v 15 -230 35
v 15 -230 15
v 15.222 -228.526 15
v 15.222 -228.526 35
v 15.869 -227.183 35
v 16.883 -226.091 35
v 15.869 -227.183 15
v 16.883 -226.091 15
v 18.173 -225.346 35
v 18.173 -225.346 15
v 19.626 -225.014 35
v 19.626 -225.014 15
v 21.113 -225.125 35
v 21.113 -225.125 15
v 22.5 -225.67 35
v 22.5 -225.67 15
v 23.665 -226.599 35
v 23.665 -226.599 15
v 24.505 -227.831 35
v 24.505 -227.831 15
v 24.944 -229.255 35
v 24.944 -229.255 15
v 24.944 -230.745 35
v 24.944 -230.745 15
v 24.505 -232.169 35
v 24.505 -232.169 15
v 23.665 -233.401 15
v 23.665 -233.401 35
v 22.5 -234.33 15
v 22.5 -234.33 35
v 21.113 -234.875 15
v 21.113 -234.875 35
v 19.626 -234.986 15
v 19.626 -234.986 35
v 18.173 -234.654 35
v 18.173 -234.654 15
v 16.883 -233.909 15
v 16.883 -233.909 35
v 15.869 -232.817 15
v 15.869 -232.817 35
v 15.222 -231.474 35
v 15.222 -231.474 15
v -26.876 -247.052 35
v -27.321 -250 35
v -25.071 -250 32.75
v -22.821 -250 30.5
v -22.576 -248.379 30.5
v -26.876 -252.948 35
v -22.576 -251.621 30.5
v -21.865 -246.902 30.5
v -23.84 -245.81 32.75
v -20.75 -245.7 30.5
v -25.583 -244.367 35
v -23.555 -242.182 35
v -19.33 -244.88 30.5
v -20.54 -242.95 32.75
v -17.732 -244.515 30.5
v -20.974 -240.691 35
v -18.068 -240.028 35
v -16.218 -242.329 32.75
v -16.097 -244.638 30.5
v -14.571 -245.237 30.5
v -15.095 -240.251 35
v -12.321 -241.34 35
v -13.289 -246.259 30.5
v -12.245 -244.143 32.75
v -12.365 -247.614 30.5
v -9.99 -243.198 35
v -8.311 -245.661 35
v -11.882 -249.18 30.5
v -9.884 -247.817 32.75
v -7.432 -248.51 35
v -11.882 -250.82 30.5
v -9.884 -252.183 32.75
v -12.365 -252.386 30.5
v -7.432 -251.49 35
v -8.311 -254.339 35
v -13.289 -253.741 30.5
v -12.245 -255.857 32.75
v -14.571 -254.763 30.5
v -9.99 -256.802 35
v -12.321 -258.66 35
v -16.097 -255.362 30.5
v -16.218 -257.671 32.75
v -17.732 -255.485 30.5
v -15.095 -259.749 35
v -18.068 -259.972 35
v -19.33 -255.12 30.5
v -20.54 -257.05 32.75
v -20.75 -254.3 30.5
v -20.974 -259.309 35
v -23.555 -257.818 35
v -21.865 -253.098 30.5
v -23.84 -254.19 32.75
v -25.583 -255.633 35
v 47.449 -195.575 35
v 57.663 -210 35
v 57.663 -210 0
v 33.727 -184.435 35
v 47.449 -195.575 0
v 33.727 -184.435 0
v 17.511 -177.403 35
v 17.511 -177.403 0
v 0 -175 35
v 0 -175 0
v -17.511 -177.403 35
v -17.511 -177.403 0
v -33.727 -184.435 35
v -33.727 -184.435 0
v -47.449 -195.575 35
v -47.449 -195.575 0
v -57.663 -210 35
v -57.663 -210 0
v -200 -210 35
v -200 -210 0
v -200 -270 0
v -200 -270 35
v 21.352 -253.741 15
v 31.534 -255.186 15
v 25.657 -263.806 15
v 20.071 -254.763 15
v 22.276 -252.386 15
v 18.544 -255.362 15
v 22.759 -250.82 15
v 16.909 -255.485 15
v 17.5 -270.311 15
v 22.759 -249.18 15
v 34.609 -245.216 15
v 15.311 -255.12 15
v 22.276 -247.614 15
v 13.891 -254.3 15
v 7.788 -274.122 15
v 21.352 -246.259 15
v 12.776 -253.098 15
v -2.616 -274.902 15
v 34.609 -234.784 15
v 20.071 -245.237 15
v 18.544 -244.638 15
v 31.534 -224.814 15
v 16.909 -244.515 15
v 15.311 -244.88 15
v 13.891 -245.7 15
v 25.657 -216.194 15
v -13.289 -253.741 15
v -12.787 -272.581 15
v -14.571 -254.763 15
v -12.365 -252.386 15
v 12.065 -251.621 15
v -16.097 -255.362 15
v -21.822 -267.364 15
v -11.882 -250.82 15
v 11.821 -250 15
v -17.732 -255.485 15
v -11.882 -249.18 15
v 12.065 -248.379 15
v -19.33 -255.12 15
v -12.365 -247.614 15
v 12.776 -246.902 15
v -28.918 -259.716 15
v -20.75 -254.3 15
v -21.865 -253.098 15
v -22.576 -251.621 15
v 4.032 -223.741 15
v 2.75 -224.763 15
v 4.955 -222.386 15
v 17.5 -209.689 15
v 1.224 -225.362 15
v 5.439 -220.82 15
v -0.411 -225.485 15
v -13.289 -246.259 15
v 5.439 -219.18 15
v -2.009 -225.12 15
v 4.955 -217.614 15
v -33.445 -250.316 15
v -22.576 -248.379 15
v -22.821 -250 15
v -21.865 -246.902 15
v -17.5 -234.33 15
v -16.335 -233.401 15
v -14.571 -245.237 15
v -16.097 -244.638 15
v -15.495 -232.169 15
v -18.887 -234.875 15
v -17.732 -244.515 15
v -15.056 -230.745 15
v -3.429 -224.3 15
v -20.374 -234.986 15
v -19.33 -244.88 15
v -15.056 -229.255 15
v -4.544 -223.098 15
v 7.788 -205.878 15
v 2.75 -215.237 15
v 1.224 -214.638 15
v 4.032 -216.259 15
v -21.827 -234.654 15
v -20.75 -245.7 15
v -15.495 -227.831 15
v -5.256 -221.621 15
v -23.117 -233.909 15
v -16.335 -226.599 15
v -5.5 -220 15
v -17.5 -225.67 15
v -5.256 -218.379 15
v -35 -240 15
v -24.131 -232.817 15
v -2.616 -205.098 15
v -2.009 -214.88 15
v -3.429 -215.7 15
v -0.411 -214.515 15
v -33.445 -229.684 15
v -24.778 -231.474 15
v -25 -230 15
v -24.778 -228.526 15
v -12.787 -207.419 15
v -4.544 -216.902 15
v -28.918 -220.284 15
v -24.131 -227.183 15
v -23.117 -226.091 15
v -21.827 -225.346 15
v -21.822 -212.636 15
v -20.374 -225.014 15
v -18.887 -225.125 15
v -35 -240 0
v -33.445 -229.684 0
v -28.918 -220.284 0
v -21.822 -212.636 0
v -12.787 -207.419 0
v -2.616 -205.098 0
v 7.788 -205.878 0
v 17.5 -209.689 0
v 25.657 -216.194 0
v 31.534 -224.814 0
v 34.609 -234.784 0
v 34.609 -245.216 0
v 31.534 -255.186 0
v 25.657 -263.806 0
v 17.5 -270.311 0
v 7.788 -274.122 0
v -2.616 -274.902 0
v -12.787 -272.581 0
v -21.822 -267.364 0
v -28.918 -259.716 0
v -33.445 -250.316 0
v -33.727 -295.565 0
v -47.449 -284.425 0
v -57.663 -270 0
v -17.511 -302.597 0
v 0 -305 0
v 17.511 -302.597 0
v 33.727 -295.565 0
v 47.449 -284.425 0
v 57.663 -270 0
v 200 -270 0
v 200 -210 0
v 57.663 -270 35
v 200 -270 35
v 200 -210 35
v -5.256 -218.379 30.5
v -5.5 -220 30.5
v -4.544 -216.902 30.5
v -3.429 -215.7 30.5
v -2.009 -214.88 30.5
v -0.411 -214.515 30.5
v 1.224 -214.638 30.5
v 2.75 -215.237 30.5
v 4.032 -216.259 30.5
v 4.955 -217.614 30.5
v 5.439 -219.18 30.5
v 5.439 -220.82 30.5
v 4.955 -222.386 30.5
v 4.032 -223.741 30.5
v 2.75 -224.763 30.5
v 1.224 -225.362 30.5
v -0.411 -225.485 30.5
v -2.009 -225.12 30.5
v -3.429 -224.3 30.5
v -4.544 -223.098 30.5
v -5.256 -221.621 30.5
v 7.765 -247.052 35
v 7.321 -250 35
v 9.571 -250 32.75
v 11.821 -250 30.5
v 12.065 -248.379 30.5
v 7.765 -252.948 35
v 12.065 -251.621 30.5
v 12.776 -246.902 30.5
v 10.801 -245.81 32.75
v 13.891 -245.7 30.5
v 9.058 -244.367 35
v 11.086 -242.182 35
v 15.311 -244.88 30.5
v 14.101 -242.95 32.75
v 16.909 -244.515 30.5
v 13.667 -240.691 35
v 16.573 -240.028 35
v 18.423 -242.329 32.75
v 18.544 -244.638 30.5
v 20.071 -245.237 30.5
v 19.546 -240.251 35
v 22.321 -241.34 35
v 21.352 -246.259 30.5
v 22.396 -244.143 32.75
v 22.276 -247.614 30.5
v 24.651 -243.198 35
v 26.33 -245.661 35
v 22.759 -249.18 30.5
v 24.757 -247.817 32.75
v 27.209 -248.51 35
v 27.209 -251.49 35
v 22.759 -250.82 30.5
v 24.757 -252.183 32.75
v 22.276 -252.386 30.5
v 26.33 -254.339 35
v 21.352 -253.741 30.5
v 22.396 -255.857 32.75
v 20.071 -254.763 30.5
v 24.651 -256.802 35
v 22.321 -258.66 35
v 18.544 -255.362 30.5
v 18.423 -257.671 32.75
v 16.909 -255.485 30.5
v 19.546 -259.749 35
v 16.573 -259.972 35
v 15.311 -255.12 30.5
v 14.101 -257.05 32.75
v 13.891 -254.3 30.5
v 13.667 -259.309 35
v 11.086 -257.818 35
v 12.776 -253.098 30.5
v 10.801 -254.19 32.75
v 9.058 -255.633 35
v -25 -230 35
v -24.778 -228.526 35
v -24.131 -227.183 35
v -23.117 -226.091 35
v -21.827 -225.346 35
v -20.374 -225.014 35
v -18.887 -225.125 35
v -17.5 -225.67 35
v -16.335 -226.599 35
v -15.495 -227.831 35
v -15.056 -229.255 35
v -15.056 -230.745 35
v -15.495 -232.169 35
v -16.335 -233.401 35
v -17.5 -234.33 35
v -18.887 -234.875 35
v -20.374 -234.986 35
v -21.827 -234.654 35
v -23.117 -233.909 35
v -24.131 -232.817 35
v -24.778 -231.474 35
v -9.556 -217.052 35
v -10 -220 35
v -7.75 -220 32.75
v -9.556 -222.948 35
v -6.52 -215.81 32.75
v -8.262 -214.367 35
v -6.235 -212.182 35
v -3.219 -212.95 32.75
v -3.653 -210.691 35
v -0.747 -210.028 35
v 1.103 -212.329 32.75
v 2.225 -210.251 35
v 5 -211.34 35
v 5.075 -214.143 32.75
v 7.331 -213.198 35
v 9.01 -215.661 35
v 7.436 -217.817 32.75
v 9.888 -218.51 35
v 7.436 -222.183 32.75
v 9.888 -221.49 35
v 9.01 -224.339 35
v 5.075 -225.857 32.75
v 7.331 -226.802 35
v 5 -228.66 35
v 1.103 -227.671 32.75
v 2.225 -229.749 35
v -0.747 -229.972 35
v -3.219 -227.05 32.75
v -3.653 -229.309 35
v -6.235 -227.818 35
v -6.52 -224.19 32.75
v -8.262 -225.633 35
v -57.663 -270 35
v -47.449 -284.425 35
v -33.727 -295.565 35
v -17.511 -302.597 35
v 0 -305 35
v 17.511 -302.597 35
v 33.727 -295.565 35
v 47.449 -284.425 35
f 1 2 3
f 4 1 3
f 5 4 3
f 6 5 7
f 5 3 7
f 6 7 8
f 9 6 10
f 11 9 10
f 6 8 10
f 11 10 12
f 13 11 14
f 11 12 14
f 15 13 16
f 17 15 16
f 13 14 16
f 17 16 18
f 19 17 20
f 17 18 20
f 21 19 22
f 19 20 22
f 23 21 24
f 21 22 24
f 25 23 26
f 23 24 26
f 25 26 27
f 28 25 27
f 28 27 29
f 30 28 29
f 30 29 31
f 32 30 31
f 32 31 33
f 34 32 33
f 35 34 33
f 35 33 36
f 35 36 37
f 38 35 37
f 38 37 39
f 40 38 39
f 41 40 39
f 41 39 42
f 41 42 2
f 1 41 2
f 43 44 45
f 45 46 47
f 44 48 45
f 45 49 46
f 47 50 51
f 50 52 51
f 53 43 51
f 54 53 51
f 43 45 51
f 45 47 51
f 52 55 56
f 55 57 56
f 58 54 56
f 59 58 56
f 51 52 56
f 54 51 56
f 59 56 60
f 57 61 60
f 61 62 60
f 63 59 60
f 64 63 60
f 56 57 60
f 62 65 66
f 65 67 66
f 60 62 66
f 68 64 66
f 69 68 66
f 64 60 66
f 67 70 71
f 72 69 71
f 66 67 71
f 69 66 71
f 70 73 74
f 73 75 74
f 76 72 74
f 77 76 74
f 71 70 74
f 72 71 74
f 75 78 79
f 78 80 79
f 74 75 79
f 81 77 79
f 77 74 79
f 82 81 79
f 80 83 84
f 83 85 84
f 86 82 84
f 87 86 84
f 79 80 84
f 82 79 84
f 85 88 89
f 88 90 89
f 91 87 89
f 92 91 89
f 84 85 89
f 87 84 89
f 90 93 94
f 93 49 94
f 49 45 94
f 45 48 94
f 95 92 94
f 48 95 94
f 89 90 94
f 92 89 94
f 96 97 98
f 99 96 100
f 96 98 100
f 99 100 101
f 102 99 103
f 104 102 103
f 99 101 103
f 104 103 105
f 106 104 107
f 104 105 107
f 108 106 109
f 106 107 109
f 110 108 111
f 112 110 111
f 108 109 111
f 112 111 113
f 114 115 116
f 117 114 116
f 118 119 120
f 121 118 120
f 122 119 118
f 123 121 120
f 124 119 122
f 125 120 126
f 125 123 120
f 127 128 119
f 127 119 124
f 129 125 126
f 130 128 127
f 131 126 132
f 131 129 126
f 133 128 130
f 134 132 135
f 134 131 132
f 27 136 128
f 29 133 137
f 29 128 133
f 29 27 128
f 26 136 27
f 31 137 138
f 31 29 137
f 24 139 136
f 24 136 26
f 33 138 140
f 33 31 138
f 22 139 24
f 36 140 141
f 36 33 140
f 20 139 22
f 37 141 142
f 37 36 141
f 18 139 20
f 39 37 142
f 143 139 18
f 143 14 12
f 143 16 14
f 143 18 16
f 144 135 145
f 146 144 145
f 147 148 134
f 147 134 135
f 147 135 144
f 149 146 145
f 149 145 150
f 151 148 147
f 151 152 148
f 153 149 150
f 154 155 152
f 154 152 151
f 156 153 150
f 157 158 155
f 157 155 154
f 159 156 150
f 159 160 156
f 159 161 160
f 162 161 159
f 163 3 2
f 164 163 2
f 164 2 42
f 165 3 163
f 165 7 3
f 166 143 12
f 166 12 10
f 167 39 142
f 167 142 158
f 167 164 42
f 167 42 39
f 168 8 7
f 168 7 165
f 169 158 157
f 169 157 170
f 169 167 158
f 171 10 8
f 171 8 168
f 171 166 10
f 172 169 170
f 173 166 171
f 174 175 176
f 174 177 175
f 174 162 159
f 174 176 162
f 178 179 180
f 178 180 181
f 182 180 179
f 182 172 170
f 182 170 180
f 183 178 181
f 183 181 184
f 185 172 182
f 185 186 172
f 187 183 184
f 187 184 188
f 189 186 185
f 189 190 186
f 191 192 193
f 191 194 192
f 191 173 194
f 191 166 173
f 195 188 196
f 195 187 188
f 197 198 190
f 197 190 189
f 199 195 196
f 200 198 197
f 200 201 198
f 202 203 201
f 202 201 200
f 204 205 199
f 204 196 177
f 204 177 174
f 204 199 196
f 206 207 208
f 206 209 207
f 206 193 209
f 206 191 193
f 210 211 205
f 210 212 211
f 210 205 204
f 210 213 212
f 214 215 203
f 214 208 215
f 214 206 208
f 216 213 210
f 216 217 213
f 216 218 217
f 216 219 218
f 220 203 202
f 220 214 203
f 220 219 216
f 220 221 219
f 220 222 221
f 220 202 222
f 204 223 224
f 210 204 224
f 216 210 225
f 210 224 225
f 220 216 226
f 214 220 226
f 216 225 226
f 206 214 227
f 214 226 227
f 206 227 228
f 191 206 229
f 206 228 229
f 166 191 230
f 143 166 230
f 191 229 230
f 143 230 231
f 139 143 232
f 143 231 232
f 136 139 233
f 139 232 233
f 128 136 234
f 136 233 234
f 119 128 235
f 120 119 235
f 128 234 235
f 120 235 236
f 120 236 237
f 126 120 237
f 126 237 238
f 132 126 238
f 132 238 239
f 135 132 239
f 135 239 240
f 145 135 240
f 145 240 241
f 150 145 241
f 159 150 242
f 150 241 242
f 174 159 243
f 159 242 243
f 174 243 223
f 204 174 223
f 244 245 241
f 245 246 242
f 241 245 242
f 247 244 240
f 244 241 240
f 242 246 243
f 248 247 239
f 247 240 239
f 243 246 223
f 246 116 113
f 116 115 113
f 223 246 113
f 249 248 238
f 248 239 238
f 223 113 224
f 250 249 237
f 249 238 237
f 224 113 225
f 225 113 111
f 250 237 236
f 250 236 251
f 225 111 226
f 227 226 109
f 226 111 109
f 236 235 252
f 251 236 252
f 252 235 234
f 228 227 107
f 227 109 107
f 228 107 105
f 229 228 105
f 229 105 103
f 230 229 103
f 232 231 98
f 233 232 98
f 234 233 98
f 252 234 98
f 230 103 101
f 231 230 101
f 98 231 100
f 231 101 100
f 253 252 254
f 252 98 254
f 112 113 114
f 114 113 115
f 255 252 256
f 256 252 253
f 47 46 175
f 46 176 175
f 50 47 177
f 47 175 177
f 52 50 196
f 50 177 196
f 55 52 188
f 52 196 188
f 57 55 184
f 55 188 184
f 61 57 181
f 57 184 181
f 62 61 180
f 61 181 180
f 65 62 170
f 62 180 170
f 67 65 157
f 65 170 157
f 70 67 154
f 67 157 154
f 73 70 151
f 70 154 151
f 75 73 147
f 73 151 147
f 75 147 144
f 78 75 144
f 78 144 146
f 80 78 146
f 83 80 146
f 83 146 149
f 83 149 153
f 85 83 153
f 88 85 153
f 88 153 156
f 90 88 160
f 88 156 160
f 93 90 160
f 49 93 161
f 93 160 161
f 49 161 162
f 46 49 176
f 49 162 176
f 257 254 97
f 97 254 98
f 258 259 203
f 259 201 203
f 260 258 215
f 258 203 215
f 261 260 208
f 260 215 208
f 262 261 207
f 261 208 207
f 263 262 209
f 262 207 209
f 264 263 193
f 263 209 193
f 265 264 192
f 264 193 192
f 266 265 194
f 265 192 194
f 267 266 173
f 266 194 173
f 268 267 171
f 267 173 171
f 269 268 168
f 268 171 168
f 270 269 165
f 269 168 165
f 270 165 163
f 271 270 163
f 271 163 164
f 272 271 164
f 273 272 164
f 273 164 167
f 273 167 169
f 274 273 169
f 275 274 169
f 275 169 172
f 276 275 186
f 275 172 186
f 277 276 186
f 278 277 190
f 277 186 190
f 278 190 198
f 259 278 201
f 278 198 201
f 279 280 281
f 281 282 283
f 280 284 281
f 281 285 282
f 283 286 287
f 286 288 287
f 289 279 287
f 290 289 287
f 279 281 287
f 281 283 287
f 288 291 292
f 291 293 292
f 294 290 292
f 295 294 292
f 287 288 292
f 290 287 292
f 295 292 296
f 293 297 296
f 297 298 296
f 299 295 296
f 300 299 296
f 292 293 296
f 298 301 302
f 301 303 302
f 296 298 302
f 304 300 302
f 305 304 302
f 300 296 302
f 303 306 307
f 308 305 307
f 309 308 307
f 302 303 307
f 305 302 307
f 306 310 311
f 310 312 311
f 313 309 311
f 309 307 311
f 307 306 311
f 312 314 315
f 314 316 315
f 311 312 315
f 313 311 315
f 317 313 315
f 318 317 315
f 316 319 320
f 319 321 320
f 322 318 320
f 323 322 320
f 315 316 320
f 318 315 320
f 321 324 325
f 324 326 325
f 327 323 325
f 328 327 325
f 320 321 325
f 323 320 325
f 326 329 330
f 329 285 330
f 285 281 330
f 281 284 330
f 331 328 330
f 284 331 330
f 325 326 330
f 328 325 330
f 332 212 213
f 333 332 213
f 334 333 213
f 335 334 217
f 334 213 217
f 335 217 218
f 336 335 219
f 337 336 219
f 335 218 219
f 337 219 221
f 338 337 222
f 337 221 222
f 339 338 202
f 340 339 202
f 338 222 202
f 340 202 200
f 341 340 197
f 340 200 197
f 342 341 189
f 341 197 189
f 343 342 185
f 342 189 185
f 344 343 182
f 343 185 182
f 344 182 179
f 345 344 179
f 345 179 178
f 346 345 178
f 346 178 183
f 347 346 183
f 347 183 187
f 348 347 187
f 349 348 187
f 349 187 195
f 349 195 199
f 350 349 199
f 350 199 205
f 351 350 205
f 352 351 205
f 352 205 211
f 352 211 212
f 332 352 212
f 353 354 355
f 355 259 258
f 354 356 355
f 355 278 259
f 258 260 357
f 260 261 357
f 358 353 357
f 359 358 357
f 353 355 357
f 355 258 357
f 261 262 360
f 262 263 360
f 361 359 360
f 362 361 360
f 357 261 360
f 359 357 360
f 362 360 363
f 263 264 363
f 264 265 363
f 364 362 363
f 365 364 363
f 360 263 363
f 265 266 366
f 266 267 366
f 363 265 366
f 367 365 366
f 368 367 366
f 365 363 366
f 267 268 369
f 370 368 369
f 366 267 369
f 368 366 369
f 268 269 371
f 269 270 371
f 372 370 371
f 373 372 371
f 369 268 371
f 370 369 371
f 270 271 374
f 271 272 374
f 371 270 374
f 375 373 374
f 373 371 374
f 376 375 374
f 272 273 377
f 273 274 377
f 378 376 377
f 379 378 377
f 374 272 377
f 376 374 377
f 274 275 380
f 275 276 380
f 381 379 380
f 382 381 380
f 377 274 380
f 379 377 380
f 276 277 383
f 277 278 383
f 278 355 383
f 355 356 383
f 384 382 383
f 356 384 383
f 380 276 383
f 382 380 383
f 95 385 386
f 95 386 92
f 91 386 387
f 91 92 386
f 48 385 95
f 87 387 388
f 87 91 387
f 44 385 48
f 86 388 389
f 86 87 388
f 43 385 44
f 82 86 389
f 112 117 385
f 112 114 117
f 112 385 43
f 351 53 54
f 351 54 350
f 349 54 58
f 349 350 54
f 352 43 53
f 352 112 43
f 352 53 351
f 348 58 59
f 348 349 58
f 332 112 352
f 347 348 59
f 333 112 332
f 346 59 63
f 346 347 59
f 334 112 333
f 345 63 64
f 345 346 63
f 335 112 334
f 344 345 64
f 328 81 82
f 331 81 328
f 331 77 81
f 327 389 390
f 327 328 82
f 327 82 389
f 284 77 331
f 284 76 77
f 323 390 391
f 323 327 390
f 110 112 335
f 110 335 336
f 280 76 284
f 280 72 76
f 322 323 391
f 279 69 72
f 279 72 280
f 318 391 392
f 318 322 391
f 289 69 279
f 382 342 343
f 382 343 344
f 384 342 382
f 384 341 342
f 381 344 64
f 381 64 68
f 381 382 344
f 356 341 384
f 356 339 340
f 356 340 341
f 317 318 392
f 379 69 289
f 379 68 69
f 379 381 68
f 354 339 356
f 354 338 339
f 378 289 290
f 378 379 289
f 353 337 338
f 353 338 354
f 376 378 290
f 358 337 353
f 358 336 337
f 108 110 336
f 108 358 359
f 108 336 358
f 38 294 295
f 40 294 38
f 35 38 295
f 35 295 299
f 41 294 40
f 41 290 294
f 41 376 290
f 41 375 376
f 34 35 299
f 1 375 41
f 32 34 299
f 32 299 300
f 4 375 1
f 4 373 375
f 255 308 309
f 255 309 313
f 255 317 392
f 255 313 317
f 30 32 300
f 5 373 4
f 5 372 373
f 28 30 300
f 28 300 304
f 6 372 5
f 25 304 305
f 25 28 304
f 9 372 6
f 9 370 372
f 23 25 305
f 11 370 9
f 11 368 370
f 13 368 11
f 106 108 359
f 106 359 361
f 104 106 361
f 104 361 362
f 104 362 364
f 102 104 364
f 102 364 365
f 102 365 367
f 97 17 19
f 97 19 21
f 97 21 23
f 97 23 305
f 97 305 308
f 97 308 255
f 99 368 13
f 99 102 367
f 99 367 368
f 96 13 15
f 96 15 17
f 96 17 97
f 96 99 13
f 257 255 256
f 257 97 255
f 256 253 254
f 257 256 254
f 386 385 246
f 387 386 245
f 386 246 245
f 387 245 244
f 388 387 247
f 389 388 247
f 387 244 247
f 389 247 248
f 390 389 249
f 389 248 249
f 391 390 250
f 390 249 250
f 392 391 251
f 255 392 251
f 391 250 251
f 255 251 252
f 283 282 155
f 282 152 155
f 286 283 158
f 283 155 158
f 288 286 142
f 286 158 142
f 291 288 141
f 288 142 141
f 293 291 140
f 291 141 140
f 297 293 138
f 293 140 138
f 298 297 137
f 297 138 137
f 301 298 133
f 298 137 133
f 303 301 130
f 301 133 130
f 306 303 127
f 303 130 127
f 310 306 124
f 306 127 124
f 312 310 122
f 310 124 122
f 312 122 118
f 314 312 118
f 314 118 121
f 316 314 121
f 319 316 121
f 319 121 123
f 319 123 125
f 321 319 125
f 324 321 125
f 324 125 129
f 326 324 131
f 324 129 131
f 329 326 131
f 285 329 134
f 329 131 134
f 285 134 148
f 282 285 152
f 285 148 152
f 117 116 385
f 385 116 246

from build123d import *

# Parameters (mm, degrees)
RESSALTO_EXTRUS_O1_DEPTH                             = 35
ESBO_O3_R                                            = 35
CORTE_EXTRUS_O2_DEPTH                                = 15
ESCAREADO_PARA_PARAFUSO_COM_CABE_A_ESCAR_D           = 11
ESCAREADO_PARA_PARAFUSO_COM_CABE_A_ESCAR_CSINK_D     = 20
ESCAREADO_PARA_PARAFUSO_COM_CABE_A_ESCAR_CSINK_ANGLE = 90
FUROS_GUIA_COM_10_0MM1_D                             = 10
ESBO_O2_R                                            = 35
CORTE_EXTRUS_O1_DEPTH                                = 15


with BuildPart() as part:
    # Esboço1 → Ressalto-extrusão1 (new body)
    with BuildSketch(Plane.XY):
        with BuildLine():
            Line((-200, -270), (-57.662812973, -270))
            ThreePointArc((-57.662812973, -270), (0, -305), (57.662812973, -270))
            Line((57.662812973, -270), (200, -270))
            Line((200, -270), (200, -210))
            Line((200, -210), (57.662812973, -210))
            ThreePointArc((57.662812973, -210), (0, -175), (-57.662812973, -210))
            Line((-57.662812973, -210), (-200, -210))
            Line((-200, -210), (-200, -270))
        make_face()
    extrude(amount=RESSALTO_EXTRUS_O1_DEPTH)

    # Esboço3 → Corte-extrusão2 (cut)
    with BuildSketch(Plane(origin=(0, 0, 0), x_dir=(-1, 0, 0), z_dir=(0, 0, -1))):
        with Locations((0, -240)):
            Circle(ESBO_O3_R)
    extrude(amount=-CORTE_EXTRUS_O2_DEPTH, mode=Mode.SUBTRACT)

    # Escareado para parafuso com cabeça escareada elevada de M101 (through all)
    with Locations(Plane.XY.offset(35)):
        with Locations((0, -220), (-17.320508076, -250), (17.320508076, -250)):
            CounterSinkHole(ESCAREADO_PARA_PARAFUSO_COM_CABE_A_ESCAR_D / 2, ESCAREADO_PARA_PARAFUSO_COM_CABE_A_ESCAR_CSINK_D / 2, counter_sink_angle=ESCAREADO_PARA_PARAFUSO_COM_CABE_A_ESCAR_CSINK_ANGLE)

    # Furos-guia com Ø10.0mm1 (through all)
    with Locations(Plane.XY.offset(35)):
        with Locations((-20, -230), (20, -230)):
            Hole(FUROS_GUIA_COM_10_0MM1_D / 2)

    # Esboço2 → Corte-extrusão1 (cut)
    with BuildSketch(Plane(origin=(0, 0, 0), x_dir=(-1, 0, 0), z_dir=(0, 0, -1))):
        with Locations((0, -240)):
            Circle(ESBO_O2_R)
    extrude(amount=-CORTE_EXTRUS_O1_DEPTH, mode=Mode.SUBTRACT)


solid = part.part
